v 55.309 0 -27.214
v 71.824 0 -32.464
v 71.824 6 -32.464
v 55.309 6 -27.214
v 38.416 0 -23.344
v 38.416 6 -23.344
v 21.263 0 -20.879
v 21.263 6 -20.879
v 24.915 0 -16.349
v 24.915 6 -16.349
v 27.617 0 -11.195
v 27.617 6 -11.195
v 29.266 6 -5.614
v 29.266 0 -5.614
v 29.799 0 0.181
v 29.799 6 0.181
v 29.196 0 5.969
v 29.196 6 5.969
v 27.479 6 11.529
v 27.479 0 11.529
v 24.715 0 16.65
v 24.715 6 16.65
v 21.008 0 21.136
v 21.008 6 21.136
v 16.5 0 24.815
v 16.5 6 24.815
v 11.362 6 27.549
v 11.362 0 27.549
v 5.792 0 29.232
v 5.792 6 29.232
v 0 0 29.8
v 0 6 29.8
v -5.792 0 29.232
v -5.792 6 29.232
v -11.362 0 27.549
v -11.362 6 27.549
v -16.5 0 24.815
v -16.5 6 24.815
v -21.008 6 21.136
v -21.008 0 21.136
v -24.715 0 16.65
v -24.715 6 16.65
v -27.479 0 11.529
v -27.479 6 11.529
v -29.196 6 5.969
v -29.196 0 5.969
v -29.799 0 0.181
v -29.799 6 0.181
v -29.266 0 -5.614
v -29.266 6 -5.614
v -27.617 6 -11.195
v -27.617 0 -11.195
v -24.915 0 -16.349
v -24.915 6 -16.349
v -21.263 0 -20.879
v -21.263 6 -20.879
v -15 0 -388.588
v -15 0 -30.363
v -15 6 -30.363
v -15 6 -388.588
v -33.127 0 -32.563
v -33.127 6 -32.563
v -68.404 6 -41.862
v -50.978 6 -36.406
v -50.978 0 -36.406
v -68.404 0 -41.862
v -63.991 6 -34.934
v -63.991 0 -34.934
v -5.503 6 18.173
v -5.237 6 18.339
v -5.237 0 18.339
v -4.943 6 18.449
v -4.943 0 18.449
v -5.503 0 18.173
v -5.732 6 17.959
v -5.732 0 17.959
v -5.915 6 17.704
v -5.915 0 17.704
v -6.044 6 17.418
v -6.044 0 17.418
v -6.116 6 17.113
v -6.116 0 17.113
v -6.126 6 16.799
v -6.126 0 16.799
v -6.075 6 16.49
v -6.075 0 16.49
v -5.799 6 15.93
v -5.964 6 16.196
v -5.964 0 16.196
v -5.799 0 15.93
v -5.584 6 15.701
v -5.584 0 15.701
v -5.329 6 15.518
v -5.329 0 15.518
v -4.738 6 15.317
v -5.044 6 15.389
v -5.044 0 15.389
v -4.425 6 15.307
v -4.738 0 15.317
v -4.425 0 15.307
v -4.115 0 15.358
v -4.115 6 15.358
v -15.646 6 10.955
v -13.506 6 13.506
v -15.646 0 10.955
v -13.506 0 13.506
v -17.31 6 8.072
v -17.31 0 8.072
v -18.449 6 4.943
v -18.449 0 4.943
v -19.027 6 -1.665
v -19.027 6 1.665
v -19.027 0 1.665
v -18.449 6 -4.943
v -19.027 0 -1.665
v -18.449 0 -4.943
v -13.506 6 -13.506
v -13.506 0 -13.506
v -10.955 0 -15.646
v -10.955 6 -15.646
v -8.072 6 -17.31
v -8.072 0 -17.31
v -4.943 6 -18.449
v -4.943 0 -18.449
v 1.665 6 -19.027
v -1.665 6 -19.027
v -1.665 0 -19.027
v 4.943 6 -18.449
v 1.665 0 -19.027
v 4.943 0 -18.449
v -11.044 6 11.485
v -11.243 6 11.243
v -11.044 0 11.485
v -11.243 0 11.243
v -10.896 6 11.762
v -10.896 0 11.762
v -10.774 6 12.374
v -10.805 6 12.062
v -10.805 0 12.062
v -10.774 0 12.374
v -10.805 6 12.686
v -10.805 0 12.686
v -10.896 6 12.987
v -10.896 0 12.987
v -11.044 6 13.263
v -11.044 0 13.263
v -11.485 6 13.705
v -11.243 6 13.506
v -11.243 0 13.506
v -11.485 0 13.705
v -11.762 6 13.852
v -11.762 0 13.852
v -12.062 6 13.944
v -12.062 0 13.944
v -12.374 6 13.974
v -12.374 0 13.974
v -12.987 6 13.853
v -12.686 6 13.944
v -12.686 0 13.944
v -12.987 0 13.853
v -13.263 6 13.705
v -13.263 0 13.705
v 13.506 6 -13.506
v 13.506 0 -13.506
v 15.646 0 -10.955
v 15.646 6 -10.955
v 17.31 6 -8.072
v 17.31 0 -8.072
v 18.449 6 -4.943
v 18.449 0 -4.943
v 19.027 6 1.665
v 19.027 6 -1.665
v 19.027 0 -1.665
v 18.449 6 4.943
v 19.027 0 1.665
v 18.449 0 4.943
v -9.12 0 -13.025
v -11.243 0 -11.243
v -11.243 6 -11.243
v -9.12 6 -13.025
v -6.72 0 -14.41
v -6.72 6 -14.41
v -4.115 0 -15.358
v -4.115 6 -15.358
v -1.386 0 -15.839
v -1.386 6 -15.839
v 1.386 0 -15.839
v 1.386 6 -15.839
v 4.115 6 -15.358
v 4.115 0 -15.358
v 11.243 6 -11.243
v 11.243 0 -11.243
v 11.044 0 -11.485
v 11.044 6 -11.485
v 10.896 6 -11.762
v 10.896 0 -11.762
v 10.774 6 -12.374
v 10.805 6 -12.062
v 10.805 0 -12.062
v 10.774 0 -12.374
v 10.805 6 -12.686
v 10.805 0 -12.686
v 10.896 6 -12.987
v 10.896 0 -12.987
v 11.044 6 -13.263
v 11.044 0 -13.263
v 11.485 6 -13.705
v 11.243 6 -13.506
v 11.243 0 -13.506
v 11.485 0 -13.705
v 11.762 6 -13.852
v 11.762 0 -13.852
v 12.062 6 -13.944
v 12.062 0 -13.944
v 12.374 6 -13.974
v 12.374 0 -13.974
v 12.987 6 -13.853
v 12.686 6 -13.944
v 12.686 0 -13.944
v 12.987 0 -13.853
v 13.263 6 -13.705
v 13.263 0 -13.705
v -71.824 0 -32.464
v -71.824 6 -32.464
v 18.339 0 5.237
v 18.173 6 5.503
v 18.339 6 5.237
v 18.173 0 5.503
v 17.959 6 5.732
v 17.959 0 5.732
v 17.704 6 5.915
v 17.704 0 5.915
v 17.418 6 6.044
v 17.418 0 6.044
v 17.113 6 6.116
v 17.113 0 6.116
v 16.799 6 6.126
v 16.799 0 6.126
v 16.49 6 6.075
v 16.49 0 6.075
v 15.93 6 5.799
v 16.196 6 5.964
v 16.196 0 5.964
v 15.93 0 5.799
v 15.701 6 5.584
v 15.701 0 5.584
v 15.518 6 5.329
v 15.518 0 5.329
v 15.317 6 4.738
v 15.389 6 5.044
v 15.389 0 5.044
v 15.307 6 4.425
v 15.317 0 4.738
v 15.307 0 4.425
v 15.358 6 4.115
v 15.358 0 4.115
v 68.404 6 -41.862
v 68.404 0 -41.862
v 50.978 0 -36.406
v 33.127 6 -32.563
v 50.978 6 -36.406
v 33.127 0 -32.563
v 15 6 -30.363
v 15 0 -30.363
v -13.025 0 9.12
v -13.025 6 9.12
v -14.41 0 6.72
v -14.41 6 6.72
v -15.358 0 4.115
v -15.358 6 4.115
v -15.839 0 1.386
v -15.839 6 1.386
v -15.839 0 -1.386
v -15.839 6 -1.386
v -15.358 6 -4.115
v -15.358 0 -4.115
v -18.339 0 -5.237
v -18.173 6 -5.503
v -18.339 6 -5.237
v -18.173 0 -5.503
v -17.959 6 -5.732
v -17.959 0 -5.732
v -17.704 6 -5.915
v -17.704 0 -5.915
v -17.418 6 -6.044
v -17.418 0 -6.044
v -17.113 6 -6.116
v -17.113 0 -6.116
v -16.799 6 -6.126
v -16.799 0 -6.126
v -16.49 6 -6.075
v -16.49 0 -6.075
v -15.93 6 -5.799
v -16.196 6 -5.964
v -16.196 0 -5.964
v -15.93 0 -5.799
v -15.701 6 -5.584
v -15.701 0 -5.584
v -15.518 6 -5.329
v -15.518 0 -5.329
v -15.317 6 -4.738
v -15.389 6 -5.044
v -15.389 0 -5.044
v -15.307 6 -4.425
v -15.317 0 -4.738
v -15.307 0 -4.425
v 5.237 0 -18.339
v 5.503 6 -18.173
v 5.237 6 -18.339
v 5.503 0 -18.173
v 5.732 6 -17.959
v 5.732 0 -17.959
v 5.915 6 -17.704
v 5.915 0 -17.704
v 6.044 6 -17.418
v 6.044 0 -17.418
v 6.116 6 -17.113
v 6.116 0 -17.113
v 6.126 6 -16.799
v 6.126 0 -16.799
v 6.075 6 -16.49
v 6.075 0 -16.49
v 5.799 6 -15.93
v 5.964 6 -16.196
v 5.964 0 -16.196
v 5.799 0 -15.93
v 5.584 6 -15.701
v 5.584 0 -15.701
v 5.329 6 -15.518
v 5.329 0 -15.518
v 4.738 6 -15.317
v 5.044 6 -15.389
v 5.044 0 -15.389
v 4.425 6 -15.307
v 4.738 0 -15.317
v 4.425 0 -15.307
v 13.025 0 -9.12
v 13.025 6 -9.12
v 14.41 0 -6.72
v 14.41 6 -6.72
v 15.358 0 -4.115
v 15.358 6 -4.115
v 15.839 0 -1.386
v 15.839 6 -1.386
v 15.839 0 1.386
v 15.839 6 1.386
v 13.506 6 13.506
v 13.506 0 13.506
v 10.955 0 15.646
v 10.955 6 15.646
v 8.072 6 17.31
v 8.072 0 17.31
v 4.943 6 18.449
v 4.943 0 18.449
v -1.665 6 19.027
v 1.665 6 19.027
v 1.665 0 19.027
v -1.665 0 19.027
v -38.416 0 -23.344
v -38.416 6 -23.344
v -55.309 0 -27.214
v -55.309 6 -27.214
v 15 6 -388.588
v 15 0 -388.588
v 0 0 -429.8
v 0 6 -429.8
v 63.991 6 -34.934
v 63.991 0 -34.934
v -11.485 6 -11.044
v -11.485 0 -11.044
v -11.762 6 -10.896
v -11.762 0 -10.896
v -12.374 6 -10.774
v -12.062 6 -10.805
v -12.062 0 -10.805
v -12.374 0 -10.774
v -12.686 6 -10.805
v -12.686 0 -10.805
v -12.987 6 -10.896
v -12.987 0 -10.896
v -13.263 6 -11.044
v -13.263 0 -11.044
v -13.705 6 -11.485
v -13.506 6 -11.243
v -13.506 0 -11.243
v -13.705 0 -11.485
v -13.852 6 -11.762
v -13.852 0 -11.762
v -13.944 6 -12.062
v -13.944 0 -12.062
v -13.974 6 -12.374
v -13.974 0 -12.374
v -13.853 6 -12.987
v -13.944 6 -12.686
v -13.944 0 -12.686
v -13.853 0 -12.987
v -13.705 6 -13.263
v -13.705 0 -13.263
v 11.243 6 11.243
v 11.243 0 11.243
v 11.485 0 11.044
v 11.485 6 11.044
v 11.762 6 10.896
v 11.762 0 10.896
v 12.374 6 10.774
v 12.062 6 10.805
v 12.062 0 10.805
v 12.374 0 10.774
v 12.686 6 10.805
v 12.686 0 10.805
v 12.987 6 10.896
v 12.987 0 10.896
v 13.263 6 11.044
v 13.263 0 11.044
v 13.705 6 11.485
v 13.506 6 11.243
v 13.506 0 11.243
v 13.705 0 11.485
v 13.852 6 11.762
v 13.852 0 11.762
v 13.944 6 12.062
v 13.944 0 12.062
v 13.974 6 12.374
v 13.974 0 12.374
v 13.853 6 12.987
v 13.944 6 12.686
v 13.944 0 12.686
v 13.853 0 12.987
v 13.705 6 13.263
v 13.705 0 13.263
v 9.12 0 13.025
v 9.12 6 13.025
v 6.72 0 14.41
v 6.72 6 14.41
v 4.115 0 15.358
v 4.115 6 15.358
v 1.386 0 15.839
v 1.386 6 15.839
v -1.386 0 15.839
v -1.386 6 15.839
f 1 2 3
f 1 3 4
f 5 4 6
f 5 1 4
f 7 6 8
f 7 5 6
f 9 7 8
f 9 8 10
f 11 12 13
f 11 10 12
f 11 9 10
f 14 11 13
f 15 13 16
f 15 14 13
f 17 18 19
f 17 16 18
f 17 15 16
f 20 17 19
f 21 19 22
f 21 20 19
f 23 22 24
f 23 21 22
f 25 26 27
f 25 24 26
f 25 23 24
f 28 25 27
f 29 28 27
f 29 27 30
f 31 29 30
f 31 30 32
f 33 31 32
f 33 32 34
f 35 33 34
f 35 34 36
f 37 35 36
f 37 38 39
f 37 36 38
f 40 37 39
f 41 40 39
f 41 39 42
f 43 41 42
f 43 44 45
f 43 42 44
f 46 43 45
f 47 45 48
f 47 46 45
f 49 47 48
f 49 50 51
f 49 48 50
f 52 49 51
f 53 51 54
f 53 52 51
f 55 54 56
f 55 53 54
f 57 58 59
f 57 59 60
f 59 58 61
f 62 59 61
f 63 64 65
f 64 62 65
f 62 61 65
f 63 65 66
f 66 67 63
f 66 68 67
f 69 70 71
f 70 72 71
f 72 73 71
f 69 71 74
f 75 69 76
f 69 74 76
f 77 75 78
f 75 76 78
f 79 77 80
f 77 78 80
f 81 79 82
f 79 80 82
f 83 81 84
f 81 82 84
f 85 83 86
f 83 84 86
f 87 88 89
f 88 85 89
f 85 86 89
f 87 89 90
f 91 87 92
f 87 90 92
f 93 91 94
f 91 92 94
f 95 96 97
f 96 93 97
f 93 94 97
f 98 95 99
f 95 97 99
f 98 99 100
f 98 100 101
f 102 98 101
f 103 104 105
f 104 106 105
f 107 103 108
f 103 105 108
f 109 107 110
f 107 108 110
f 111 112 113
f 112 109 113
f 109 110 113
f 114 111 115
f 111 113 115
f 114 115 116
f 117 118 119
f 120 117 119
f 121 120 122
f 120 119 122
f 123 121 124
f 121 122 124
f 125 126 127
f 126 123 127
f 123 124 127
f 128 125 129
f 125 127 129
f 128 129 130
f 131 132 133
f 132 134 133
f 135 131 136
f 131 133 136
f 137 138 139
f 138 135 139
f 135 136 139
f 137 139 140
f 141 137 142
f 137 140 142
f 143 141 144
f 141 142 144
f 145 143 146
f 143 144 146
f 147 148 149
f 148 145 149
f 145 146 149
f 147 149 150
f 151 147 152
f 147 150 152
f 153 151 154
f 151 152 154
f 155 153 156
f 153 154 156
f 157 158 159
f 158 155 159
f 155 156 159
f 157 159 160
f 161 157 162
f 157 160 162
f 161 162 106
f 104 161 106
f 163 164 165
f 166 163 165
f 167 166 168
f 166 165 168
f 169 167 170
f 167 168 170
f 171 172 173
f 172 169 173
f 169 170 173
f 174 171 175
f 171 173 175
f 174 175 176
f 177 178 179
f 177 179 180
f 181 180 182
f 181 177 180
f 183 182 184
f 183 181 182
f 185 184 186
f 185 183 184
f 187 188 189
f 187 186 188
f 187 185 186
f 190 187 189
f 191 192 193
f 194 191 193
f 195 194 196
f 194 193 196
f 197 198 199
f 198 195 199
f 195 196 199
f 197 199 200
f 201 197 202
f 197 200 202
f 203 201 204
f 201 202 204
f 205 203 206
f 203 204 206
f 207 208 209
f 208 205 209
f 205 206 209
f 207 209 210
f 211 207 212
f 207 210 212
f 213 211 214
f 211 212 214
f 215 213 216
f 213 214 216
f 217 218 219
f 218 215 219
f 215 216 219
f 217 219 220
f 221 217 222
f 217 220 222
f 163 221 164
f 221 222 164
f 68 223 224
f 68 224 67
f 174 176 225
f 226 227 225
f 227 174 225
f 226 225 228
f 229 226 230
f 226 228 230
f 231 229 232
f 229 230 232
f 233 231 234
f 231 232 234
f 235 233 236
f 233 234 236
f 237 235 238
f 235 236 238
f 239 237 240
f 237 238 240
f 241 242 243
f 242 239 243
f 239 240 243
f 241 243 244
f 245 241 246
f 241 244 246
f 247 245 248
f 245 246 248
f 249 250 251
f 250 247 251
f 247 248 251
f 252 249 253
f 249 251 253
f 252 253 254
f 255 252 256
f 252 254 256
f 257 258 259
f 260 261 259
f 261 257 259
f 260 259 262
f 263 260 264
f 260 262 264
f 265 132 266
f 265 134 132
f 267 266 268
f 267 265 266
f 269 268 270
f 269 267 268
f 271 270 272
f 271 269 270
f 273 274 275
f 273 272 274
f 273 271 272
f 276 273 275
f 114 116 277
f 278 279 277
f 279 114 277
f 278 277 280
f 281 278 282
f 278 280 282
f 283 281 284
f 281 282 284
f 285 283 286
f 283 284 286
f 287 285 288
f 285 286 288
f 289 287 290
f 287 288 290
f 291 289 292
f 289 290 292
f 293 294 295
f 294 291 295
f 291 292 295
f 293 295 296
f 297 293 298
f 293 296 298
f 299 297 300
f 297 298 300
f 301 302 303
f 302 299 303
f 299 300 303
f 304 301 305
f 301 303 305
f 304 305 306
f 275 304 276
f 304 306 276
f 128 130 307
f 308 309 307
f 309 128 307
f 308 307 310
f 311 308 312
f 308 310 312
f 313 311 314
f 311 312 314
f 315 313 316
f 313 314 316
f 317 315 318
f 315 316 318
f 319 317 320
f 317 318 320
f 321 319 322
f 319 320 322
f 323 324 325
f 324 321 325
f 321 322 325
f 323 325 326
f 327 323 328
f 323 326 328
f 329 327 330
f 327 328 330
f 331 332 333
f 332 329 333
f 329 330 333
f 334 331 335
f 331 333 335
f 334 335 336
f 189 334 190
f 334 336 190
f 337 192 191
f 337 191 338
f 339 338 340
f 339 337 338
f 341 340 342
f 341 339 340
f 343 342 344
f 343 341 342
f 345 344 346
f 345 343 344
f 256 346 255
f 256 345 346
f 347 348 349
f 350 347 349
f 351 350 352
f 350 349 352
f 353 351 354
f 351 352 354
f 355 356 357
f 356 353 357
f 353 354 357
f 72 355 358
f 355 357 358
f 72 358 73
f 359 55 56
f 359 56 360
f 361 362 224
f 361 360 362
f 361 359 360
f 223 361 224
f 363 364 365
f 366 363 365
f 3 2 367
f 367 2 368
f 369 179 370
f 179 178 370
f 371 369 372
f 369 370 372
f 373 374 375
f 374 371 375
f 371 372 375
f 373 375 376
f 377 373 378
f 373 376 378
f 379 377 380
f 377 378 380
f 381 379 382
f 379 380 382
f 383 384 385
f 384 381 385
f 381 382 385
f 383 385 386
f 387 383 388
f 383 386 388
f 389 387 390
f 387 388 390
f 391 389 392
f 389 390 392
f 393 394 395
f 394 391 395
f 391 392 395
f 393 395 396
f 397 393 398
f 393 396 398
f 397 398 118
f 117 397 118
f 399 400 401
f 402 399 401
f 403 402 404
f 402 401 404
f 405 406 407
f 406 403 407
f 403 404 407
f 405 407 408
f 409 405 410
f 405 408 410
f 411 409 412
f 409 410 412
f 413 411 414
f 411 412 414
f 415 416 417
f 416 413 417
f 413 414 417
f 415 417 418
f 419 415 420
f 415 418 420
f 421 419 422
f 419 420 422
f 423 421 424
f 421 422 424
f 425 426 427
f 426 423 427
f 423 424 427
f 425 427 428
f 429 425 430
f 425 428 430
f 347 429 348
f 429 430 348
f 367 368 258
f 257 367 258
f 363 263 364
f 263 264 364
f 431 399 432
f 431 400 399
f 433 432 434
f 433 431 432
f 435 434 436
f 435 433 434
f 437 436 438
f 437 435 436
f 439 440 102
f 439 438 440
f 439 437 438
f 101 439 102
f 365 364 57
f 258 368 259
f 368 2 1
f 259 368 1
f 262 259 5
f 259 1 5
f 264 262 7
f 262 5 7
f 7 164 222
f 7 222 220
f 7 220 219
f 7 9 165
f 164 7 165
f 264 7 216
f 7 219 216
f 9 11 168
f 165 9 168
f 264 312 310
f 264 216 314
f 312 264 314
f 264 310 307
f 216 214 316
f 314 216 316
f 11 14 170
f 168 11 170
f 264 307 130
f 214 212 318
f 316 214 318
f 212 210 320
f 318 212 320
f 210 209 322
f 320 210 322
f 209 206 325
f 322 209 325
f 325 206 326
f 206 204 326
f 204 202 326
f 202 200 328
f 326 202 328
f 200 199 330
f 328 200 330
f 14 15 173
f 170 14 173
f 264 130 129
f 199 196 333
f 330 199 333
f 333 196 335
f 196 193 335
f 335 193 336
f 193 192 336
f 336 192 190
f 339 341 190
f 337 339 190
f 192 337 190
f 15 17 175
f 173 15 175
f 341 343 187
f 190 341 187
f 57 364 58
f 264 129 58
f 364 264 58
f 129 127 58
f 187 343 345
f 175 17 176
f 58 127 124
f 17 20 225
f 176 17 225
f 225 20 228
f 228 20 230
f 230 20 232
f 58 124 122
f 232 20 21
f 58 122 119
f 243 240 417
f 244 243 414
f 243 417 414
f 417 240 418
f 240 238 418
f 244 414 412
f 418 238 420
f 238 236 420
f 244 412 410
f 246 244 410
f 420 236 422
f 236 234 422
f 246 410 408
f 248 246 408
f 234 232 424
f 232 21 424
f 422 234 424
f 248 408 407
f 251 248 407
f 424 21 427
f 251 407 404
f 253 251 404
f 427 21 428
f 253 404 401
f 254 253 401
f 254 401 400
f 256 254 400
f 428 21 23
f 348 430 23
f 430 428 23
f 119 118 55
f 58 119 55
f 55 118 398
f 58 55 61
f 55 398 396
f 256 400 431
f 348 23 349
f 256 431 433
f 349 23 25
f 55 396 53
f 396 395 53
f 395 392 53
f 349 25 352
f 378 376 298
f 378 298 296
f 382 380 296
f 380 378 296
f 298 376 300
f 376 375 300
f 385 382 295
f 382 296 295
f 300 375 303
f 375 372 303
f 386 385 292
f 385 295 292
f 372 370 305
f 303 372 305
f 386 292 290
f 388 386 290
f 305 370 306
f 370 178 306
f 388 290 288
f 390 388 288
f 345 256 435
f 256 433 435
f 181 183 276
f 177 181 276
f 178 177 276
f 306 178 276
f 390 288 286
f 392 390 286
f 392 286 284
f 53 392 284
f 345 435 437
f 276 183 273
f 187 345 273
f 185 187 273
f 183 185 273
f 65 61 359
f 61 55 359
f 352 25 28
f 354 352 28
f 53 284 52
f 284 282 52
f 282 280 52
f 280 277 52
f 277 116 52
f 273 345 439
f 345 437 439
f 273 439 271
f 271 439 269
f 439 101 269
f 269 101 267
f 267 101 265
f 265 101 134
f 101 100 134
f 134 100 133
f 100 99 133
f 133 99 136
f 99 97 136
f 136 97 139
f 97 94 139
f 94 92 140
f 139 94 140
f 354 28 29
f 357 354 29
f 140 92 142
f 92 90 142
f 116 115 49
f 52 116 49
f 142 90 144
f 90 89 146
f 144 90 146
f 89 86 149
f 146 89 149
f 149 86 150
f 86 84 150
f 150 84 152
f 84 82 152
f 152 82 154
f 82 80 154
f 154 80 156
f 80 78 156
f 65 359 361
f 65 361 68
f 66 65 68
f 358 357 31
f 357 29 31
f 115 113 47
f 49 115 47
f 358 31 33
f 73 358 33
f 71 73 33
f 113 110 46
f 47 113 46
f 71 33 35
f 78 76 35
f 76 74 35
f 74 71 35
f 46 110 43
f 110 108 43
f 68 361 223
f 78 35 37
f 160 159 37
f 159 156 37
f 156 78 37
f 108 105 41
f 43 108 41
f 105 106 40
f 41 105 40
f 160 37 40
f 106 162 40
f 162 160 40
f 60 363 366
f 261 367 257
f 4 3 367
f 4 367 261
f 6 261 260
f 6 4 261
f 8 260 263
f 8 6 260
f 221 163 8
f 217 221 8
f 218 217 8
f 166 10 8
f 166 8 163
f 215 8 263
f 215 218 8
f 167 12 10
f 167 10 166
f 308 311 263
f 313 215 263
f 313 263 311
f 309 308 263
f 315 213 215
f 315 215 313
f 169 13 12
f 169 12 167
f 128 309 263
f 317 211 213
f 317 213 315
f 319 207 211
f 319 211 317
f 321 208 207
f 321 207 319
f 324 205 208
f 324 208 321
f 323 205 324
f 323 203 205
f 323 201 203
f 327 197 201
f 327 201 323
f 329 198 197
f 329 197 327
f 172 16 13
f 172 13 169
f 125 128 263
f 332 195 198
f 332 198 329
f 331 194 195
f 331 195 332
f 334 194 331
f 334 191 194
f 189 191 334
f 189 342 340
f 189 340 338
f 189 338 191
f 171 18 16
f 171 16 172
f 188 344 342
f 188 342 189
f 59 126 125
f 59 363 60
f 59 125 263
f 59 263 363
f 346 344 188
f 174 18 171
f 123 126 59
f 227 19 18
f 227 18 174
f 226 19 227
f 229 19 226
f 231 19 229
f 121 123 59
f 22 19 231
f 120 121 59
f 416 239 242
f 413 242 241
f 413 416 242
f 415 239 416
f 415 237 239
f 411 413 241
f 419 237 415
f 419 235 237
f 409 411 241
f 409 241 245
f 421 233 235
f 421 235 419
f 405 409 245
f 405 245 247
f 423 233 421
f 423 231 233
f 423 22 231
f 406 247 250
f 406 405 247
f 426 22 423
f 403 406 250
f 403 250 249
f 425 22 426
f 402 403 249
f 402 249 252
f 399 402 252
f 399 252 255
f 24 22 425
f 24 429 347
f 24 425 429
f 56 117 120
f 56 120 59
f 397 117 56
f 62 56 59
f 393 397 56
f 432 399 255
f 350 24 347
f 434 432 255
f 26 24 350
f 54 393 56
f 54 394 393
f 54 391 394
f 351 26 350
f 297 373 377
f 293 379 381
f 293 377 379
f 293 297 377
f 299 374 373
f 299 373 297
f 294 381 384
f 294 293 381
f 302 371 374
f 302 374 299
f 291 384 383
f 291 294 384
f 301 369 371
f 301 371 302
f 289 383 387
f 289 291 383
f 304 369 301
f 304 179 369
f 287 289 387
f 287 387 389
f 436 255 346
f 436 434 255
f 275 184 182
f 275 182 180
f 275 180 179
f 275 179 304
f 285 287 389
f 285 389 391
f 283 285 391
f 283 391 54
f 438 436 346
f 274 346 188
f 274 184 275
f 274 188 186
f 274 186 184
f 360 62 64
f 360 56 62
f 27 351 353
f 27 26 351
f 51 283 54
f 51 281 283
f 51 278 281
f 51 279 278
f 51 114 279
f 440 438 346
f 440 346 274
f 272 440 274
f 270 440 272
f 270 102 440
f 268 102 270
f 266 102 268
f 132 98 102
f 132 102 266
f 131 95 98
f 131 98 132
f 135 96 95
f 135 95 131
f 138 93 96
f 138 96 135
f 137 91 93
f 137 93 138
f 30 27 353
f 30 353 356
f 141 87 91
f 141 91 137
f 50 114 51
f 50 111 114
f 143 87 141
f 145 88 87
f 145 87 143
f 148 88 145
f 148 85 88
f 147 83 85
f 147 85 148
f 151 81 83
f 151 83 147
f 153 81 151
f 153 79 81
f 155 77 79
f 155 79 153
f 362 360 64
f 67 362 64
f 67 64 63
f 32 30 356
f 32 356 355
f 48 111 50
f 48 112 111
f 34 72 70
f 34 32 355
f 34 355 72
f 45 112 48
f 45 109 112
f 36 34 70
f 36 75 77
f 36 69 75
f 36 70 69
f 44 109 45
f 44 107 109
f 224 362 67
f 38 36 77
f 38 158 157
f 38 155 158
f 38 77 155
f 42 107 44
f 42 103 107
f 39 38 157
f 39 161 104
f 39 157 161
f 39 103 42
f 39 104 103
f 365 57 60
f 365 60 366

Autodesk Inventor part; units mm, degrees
ref_plane "YZ Plane" through (0, 0, 0) normal (1, 0, 0) x (0, 1, 0)
ref_plane "XZ Plane" through (0, 0, 0) normal (0, 1, 0) x (-1, 0, 0)
ref_plane "XY Plane" through (0, 0, 0) normal (0, 0, 1) x (1, 0, 0)
sketch "Эскиз1" plane through (0, 0, 0) normal (0, 1, 0) x (-1, 0, 0)
  arc A0 (15, -25.7496) -> (-15, -25.7496) centre (0, 0) ccw
  line L0 (0, 0) -> (0, -429.8) construction
  line L1 (15, -25.7496) -> (15, -388.5878)
  line L2 (15, -388.5878) -> (0, -429.8)
  line L3 (0, 0) -> (0, -29.8) construction
  circle A1 centre (0, 0) radius 17.5 construction
  circle A2 centre (0, -17.5) radius 1.6 construction
  line L4 (12.3744, -12.3744) -> (0, 0) construction
  arc A3 (-4.9434, -18.4492) -> (13.5057, -13.5057) centre (0, 0) ccw
  arc A4 (-4.1152, -15.3582) -> (11.243, -11.243) centre (0, 0) ccw
  arc A5 (-4.1152, -15.3582) -> (-4.9434, -18.4492) centre (-4.5293, -16.9037) ccw
  line L5 (0, 0) -> (-4.5293, -16.9037) construction
  arc A6 (13.5057, -13.5057) -> (11.243, -11.243) centre (12.3744, -12.3744) ccw
  arc A7 (18.4492, -4.9434) -> (13.5057, 13.5057) centre (0, 0) ccw
  circle A8 centre (17.5, 0) radius 1.6 construction
  arc A9 (15.3582, -4.1152) -> (11.243, 11.243) centre (0, 0) ccw
  arc A10 (15.3582, -4.1152) -> (18.4492, -4.9434) centre (16.9037, -4.5293) ccw
  arc A11 (13.5057, 13.5057) -> (11.243, 11.243) centre (12.3744, 12.3744) ccw
  arc A12 (4.9434, 18.4492) -> (-13.5057, 13.5057) centre (0, 0) ccw
  circle A13 centre (0, 17.5) radius 1.6 construction
  arc A14 (4.1152, 15.3582) -> (-11.243, 11.243) centre (0, 0) ccw
  arc A15 (4.1152, 15.3582) -> (4.9434, 18.4492) centre (4.5293, 16.9037) ccw
  arc A16 (-13.5057, 13.5057) -> (-11.243, 11.243) centre (-12.3744, 12.3744) ccw
  arc A17 (-18.4492, 4.9434) -> (-13.5057, -13.5057) centre (0, 0) ccw
  circle A18 centre (-17.5, 0) radius 1.6 construction
  arc A19 (-15.3582, 4.1152) -> (-11.243, -11.243) centre (0, 0) ccw
  arc A20 (-15.3582, 4.1152) -> (-18.4492, 4.9434) centre (-16.9037, 4.5293) ccw
  arc A21 (-13.5057, -13.5057) -> (-11.243, -11.243) centre (-12.3744, -12.3744) ccw
  line L6 (-15, -25.7496) -> (-15, -388.5878)
  line L7 (-15, -388.5878) -> (0, -429.8)
  circle A22 centre (0, -229.8) radius 200
  line L8 (0, -29.8) -> (0, -229.8) construction
  circle A23 centre (0, -229.8) radius 210
  line L9 (0, -229.8) -> (71.8242, -32.4645) construction
  line L10 (71.8242, -32.4645) -> (63.991, -34.9344)
  line L11 (63.991, -34.9344) -> (68.404, -41.8615)
  line L12 (-71.8242, -32.4645) -> (-63.991, -34.9344)
  line L13 (-63.991, -34.9344) -> (-68.404, -41.8615)
  point P0 (-15, -30.3633)
  point P1 (15, -30.3633)
  point P2 (21.2626, -20.8792)
  point P3 (-21.2626, -20.8792)
  point P4 (-71.8242, -32.4645)
  point P5 (-68.404, -41.8615)
  dimension "d0" = 59.6
  dimension "d1" = 400
  dimension "d2" = 20
  dimension "d3" = 15
  dimension "d4" = 35
  dimension "d5" = 3.2
  dimension "d6" = 45
  dimension "d7" = 15
  dimension "d8" = 3.2
  dimension "d11" = 360
  dimension "d14" = 29.8
  dimension "d15" = 200
  dimension "d17" = 20
  dimension "d18" = 75
  dimension "d19" = 10
extrude "Выдавливание1" add sketch "Эскиз1" along normal blind 6 contours L1 A22 L6 A0 A23 | A0 A23 L10 L11 A22 L1 | A23 A0 | L1 L2 L7 L6 A22 | A0 L6 A22 L13 L12 A23
properties part number "клинок"
